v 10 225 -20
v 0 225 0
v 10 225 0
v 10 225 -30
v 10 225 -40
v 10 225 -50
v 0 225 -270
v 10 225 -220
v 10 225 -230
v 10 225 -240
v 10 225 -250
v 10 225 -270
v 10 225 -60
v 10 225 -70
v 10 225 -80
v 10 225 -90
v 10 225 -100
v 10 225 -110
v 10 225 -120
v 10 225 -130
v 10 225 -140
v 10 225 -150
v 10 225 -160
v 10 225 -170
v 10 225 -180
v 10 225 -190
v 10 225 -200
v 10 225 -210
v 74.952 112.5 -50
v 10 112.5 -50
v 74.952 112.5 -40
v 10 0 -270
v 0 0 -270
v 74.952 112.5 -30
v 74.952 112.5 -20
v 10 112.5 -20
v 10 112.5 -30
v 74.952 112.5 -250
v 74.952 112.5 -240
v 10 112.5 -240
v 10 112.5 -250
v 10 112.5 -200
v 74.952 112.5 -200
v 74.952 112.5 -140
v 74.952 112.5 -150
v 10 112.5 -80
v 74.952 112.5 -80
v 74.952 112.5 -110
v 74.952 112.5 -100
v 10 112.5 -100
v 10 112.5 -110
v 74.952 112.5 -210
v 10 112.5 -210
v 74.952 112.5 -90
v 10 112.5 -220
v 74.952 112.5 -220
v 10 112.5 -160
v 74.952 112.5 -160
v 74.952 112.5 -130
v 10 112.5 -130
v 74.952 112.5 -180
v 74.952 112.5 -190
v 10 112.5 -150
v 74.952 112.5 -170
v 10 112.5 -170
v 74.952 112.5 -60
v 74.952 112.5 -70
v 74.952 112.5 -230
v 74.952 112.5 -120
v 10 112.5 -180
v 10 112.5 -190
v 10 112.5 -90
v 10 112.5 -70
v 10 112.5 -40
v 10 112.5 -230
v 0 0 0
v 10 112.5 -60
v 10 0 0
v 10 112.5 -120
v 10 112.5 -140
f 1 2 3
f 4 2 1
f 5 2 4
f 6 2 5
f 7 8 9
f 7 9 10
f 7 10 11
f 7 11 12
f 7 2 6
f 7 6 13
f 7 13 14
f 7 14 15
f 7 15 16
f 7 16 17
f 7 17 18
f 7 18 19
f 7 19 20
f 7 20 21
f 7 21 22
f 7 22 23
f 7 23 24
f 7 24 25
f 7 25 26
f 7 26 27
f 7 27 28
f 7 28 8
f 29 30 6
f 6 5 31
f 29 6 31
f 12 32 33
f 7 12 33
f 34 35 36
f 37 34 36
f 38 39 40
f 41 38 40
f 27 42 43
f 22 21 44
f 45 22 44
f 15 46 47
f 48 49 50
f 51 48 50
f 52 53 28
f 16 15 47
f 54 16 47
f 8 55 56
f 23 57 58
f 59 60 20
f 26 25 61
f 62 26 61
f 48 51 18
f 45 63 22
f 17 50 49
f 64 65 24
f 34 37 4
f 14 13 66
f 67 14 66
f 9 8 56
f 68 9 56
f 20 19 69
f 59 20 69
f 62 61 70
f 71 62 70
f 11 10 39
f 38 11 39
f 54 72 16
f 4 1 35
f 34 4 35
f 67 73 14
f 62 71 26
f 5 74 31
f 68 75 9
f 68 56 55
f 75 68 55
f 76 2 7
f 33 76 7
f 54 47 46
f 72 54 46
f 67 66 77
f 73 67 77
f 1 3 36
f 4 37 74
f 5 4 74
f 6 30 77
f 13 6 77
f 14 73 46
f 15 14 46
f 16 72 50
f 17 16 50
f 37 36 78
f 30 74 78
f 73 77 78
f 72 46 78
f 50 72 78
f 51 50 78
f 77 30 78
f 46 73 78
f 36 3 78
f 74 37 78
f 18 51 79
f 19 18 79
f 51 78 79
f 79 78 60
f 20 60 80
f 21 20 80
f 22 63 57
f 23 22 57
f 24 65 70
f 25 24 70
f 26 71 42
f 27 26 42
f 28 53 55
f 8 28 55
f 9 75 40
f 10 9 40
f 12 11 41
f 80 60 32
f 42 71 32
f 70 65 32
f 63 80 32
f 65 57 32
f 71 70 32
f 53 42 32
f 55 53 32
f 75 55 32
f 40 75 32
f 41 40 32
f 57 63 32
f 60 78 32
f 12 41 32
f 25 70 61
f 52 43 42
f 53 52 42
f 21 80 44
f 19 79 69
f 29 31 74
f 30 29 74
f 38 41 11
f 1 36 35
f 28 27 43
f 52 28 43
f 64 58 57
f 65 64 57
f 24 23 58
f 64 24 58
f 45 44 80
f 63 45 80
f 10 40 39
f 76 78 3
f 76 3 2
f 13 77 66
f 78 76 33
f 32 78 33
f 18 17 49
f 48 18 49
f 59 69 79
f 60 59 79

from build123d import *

# Parameters (mm, degrees)
SKETCH2_W           = 270
SKETCH2_H           = 225
BOSS_EXTRUDE1_DEPTH = 10
BOSS_EXTRUDE4_DEPTH = 270
SKETCH5_W           = 64.951905284
SKETCH5_H           = 10
CUT_EXTRUDE1_DEPTH  = 302.95039014


with BuildPart() as part:
    # Sketch2 → Boss-Extrude1 (new body)
    with BuildSketch(Plane(origin=(0, 0, 0), x_dir=(0, 0, -1), z_dir=(1, 0, 0))):
        with Locations((135, 112.5)):
            Rectangle(SKETCH2_W, SKETCH2_H)
    extrude(amount=BOSS_EXTRUDE1_DEPTH)

    # Sketch4 → Boss-Extrude4 (add)
    with BuildSketch(Plane.XY):
        Polygon((10, 225), (74.951905284, 112.5), (10, 112.5), align=None)
    extrude(amount=-BOSS_EXTRUDE4_DEPTH)

    # Sketch5 → Cut-Extrude1 (cut, through all)
    with BuildSketch(Plane.XZ.offset(-112.5)):
        with Locations((42.475952642, -265)):
            Rectangle(SKETCH5_W, SKETCH5_H)
        with Locations((42.475952642, -255)):
            Rectangle(SKETCH5_W, SKETCH5_H)
        with Locations((42.475952642, -235)):
            Rectangle(SKETCH5_W, SKETCH5_H)
        with Locations((42.475952642, -215)):
            Rectangle(SKETCH5_W, SKETCH5_H)
        with Locations((42.475952642, -195)):
            Rectangle(SKETCH5_W, SKETCH5_H)
        with Locations((42.475952642, -175)):
            Rectangle(SKETCH5_W, SKETCH5_H)
        with Locations((42.475952642, -155)):
            Rectangle(SKETCH5_W, SKETCH5_H)
        with Locations((42.475952642, -135)):
            Rectangle(SKETCH5_W, SKETCH5_H)
        with Locations((42.475952642, -115)):
            Rectangle(SKETCH5_W, SKETCH5_H)
        with Locations((42.475952642, -95)):
            Rectangle(SKETCH5_W, SKETCH5_H)
        with Locations((42.475952642, -75)):
            Rectangle(SKETCH5_W, SKETCH5_H)
        with Locations((42.475952642, -55)):
            Rectangle(SKETCH5_W, SKETCH5_H)
        with Locations((42.475952642, -35)):
            Rectangle(SKETCH5_W, SKETCH5_H)
        with Locations((42.475952642, -15)):
            Rectangle(SKETCH5_W, SKETCH5_H)
        with Locations((42.475952642, -5)):
            Rectangle(SKETCH5_W, SKETCH5_H)
    extrude(amount=-CUT_EXTRUDE1_DEPTH, mode=Mode.SUBTRACT)


solid = part.part
